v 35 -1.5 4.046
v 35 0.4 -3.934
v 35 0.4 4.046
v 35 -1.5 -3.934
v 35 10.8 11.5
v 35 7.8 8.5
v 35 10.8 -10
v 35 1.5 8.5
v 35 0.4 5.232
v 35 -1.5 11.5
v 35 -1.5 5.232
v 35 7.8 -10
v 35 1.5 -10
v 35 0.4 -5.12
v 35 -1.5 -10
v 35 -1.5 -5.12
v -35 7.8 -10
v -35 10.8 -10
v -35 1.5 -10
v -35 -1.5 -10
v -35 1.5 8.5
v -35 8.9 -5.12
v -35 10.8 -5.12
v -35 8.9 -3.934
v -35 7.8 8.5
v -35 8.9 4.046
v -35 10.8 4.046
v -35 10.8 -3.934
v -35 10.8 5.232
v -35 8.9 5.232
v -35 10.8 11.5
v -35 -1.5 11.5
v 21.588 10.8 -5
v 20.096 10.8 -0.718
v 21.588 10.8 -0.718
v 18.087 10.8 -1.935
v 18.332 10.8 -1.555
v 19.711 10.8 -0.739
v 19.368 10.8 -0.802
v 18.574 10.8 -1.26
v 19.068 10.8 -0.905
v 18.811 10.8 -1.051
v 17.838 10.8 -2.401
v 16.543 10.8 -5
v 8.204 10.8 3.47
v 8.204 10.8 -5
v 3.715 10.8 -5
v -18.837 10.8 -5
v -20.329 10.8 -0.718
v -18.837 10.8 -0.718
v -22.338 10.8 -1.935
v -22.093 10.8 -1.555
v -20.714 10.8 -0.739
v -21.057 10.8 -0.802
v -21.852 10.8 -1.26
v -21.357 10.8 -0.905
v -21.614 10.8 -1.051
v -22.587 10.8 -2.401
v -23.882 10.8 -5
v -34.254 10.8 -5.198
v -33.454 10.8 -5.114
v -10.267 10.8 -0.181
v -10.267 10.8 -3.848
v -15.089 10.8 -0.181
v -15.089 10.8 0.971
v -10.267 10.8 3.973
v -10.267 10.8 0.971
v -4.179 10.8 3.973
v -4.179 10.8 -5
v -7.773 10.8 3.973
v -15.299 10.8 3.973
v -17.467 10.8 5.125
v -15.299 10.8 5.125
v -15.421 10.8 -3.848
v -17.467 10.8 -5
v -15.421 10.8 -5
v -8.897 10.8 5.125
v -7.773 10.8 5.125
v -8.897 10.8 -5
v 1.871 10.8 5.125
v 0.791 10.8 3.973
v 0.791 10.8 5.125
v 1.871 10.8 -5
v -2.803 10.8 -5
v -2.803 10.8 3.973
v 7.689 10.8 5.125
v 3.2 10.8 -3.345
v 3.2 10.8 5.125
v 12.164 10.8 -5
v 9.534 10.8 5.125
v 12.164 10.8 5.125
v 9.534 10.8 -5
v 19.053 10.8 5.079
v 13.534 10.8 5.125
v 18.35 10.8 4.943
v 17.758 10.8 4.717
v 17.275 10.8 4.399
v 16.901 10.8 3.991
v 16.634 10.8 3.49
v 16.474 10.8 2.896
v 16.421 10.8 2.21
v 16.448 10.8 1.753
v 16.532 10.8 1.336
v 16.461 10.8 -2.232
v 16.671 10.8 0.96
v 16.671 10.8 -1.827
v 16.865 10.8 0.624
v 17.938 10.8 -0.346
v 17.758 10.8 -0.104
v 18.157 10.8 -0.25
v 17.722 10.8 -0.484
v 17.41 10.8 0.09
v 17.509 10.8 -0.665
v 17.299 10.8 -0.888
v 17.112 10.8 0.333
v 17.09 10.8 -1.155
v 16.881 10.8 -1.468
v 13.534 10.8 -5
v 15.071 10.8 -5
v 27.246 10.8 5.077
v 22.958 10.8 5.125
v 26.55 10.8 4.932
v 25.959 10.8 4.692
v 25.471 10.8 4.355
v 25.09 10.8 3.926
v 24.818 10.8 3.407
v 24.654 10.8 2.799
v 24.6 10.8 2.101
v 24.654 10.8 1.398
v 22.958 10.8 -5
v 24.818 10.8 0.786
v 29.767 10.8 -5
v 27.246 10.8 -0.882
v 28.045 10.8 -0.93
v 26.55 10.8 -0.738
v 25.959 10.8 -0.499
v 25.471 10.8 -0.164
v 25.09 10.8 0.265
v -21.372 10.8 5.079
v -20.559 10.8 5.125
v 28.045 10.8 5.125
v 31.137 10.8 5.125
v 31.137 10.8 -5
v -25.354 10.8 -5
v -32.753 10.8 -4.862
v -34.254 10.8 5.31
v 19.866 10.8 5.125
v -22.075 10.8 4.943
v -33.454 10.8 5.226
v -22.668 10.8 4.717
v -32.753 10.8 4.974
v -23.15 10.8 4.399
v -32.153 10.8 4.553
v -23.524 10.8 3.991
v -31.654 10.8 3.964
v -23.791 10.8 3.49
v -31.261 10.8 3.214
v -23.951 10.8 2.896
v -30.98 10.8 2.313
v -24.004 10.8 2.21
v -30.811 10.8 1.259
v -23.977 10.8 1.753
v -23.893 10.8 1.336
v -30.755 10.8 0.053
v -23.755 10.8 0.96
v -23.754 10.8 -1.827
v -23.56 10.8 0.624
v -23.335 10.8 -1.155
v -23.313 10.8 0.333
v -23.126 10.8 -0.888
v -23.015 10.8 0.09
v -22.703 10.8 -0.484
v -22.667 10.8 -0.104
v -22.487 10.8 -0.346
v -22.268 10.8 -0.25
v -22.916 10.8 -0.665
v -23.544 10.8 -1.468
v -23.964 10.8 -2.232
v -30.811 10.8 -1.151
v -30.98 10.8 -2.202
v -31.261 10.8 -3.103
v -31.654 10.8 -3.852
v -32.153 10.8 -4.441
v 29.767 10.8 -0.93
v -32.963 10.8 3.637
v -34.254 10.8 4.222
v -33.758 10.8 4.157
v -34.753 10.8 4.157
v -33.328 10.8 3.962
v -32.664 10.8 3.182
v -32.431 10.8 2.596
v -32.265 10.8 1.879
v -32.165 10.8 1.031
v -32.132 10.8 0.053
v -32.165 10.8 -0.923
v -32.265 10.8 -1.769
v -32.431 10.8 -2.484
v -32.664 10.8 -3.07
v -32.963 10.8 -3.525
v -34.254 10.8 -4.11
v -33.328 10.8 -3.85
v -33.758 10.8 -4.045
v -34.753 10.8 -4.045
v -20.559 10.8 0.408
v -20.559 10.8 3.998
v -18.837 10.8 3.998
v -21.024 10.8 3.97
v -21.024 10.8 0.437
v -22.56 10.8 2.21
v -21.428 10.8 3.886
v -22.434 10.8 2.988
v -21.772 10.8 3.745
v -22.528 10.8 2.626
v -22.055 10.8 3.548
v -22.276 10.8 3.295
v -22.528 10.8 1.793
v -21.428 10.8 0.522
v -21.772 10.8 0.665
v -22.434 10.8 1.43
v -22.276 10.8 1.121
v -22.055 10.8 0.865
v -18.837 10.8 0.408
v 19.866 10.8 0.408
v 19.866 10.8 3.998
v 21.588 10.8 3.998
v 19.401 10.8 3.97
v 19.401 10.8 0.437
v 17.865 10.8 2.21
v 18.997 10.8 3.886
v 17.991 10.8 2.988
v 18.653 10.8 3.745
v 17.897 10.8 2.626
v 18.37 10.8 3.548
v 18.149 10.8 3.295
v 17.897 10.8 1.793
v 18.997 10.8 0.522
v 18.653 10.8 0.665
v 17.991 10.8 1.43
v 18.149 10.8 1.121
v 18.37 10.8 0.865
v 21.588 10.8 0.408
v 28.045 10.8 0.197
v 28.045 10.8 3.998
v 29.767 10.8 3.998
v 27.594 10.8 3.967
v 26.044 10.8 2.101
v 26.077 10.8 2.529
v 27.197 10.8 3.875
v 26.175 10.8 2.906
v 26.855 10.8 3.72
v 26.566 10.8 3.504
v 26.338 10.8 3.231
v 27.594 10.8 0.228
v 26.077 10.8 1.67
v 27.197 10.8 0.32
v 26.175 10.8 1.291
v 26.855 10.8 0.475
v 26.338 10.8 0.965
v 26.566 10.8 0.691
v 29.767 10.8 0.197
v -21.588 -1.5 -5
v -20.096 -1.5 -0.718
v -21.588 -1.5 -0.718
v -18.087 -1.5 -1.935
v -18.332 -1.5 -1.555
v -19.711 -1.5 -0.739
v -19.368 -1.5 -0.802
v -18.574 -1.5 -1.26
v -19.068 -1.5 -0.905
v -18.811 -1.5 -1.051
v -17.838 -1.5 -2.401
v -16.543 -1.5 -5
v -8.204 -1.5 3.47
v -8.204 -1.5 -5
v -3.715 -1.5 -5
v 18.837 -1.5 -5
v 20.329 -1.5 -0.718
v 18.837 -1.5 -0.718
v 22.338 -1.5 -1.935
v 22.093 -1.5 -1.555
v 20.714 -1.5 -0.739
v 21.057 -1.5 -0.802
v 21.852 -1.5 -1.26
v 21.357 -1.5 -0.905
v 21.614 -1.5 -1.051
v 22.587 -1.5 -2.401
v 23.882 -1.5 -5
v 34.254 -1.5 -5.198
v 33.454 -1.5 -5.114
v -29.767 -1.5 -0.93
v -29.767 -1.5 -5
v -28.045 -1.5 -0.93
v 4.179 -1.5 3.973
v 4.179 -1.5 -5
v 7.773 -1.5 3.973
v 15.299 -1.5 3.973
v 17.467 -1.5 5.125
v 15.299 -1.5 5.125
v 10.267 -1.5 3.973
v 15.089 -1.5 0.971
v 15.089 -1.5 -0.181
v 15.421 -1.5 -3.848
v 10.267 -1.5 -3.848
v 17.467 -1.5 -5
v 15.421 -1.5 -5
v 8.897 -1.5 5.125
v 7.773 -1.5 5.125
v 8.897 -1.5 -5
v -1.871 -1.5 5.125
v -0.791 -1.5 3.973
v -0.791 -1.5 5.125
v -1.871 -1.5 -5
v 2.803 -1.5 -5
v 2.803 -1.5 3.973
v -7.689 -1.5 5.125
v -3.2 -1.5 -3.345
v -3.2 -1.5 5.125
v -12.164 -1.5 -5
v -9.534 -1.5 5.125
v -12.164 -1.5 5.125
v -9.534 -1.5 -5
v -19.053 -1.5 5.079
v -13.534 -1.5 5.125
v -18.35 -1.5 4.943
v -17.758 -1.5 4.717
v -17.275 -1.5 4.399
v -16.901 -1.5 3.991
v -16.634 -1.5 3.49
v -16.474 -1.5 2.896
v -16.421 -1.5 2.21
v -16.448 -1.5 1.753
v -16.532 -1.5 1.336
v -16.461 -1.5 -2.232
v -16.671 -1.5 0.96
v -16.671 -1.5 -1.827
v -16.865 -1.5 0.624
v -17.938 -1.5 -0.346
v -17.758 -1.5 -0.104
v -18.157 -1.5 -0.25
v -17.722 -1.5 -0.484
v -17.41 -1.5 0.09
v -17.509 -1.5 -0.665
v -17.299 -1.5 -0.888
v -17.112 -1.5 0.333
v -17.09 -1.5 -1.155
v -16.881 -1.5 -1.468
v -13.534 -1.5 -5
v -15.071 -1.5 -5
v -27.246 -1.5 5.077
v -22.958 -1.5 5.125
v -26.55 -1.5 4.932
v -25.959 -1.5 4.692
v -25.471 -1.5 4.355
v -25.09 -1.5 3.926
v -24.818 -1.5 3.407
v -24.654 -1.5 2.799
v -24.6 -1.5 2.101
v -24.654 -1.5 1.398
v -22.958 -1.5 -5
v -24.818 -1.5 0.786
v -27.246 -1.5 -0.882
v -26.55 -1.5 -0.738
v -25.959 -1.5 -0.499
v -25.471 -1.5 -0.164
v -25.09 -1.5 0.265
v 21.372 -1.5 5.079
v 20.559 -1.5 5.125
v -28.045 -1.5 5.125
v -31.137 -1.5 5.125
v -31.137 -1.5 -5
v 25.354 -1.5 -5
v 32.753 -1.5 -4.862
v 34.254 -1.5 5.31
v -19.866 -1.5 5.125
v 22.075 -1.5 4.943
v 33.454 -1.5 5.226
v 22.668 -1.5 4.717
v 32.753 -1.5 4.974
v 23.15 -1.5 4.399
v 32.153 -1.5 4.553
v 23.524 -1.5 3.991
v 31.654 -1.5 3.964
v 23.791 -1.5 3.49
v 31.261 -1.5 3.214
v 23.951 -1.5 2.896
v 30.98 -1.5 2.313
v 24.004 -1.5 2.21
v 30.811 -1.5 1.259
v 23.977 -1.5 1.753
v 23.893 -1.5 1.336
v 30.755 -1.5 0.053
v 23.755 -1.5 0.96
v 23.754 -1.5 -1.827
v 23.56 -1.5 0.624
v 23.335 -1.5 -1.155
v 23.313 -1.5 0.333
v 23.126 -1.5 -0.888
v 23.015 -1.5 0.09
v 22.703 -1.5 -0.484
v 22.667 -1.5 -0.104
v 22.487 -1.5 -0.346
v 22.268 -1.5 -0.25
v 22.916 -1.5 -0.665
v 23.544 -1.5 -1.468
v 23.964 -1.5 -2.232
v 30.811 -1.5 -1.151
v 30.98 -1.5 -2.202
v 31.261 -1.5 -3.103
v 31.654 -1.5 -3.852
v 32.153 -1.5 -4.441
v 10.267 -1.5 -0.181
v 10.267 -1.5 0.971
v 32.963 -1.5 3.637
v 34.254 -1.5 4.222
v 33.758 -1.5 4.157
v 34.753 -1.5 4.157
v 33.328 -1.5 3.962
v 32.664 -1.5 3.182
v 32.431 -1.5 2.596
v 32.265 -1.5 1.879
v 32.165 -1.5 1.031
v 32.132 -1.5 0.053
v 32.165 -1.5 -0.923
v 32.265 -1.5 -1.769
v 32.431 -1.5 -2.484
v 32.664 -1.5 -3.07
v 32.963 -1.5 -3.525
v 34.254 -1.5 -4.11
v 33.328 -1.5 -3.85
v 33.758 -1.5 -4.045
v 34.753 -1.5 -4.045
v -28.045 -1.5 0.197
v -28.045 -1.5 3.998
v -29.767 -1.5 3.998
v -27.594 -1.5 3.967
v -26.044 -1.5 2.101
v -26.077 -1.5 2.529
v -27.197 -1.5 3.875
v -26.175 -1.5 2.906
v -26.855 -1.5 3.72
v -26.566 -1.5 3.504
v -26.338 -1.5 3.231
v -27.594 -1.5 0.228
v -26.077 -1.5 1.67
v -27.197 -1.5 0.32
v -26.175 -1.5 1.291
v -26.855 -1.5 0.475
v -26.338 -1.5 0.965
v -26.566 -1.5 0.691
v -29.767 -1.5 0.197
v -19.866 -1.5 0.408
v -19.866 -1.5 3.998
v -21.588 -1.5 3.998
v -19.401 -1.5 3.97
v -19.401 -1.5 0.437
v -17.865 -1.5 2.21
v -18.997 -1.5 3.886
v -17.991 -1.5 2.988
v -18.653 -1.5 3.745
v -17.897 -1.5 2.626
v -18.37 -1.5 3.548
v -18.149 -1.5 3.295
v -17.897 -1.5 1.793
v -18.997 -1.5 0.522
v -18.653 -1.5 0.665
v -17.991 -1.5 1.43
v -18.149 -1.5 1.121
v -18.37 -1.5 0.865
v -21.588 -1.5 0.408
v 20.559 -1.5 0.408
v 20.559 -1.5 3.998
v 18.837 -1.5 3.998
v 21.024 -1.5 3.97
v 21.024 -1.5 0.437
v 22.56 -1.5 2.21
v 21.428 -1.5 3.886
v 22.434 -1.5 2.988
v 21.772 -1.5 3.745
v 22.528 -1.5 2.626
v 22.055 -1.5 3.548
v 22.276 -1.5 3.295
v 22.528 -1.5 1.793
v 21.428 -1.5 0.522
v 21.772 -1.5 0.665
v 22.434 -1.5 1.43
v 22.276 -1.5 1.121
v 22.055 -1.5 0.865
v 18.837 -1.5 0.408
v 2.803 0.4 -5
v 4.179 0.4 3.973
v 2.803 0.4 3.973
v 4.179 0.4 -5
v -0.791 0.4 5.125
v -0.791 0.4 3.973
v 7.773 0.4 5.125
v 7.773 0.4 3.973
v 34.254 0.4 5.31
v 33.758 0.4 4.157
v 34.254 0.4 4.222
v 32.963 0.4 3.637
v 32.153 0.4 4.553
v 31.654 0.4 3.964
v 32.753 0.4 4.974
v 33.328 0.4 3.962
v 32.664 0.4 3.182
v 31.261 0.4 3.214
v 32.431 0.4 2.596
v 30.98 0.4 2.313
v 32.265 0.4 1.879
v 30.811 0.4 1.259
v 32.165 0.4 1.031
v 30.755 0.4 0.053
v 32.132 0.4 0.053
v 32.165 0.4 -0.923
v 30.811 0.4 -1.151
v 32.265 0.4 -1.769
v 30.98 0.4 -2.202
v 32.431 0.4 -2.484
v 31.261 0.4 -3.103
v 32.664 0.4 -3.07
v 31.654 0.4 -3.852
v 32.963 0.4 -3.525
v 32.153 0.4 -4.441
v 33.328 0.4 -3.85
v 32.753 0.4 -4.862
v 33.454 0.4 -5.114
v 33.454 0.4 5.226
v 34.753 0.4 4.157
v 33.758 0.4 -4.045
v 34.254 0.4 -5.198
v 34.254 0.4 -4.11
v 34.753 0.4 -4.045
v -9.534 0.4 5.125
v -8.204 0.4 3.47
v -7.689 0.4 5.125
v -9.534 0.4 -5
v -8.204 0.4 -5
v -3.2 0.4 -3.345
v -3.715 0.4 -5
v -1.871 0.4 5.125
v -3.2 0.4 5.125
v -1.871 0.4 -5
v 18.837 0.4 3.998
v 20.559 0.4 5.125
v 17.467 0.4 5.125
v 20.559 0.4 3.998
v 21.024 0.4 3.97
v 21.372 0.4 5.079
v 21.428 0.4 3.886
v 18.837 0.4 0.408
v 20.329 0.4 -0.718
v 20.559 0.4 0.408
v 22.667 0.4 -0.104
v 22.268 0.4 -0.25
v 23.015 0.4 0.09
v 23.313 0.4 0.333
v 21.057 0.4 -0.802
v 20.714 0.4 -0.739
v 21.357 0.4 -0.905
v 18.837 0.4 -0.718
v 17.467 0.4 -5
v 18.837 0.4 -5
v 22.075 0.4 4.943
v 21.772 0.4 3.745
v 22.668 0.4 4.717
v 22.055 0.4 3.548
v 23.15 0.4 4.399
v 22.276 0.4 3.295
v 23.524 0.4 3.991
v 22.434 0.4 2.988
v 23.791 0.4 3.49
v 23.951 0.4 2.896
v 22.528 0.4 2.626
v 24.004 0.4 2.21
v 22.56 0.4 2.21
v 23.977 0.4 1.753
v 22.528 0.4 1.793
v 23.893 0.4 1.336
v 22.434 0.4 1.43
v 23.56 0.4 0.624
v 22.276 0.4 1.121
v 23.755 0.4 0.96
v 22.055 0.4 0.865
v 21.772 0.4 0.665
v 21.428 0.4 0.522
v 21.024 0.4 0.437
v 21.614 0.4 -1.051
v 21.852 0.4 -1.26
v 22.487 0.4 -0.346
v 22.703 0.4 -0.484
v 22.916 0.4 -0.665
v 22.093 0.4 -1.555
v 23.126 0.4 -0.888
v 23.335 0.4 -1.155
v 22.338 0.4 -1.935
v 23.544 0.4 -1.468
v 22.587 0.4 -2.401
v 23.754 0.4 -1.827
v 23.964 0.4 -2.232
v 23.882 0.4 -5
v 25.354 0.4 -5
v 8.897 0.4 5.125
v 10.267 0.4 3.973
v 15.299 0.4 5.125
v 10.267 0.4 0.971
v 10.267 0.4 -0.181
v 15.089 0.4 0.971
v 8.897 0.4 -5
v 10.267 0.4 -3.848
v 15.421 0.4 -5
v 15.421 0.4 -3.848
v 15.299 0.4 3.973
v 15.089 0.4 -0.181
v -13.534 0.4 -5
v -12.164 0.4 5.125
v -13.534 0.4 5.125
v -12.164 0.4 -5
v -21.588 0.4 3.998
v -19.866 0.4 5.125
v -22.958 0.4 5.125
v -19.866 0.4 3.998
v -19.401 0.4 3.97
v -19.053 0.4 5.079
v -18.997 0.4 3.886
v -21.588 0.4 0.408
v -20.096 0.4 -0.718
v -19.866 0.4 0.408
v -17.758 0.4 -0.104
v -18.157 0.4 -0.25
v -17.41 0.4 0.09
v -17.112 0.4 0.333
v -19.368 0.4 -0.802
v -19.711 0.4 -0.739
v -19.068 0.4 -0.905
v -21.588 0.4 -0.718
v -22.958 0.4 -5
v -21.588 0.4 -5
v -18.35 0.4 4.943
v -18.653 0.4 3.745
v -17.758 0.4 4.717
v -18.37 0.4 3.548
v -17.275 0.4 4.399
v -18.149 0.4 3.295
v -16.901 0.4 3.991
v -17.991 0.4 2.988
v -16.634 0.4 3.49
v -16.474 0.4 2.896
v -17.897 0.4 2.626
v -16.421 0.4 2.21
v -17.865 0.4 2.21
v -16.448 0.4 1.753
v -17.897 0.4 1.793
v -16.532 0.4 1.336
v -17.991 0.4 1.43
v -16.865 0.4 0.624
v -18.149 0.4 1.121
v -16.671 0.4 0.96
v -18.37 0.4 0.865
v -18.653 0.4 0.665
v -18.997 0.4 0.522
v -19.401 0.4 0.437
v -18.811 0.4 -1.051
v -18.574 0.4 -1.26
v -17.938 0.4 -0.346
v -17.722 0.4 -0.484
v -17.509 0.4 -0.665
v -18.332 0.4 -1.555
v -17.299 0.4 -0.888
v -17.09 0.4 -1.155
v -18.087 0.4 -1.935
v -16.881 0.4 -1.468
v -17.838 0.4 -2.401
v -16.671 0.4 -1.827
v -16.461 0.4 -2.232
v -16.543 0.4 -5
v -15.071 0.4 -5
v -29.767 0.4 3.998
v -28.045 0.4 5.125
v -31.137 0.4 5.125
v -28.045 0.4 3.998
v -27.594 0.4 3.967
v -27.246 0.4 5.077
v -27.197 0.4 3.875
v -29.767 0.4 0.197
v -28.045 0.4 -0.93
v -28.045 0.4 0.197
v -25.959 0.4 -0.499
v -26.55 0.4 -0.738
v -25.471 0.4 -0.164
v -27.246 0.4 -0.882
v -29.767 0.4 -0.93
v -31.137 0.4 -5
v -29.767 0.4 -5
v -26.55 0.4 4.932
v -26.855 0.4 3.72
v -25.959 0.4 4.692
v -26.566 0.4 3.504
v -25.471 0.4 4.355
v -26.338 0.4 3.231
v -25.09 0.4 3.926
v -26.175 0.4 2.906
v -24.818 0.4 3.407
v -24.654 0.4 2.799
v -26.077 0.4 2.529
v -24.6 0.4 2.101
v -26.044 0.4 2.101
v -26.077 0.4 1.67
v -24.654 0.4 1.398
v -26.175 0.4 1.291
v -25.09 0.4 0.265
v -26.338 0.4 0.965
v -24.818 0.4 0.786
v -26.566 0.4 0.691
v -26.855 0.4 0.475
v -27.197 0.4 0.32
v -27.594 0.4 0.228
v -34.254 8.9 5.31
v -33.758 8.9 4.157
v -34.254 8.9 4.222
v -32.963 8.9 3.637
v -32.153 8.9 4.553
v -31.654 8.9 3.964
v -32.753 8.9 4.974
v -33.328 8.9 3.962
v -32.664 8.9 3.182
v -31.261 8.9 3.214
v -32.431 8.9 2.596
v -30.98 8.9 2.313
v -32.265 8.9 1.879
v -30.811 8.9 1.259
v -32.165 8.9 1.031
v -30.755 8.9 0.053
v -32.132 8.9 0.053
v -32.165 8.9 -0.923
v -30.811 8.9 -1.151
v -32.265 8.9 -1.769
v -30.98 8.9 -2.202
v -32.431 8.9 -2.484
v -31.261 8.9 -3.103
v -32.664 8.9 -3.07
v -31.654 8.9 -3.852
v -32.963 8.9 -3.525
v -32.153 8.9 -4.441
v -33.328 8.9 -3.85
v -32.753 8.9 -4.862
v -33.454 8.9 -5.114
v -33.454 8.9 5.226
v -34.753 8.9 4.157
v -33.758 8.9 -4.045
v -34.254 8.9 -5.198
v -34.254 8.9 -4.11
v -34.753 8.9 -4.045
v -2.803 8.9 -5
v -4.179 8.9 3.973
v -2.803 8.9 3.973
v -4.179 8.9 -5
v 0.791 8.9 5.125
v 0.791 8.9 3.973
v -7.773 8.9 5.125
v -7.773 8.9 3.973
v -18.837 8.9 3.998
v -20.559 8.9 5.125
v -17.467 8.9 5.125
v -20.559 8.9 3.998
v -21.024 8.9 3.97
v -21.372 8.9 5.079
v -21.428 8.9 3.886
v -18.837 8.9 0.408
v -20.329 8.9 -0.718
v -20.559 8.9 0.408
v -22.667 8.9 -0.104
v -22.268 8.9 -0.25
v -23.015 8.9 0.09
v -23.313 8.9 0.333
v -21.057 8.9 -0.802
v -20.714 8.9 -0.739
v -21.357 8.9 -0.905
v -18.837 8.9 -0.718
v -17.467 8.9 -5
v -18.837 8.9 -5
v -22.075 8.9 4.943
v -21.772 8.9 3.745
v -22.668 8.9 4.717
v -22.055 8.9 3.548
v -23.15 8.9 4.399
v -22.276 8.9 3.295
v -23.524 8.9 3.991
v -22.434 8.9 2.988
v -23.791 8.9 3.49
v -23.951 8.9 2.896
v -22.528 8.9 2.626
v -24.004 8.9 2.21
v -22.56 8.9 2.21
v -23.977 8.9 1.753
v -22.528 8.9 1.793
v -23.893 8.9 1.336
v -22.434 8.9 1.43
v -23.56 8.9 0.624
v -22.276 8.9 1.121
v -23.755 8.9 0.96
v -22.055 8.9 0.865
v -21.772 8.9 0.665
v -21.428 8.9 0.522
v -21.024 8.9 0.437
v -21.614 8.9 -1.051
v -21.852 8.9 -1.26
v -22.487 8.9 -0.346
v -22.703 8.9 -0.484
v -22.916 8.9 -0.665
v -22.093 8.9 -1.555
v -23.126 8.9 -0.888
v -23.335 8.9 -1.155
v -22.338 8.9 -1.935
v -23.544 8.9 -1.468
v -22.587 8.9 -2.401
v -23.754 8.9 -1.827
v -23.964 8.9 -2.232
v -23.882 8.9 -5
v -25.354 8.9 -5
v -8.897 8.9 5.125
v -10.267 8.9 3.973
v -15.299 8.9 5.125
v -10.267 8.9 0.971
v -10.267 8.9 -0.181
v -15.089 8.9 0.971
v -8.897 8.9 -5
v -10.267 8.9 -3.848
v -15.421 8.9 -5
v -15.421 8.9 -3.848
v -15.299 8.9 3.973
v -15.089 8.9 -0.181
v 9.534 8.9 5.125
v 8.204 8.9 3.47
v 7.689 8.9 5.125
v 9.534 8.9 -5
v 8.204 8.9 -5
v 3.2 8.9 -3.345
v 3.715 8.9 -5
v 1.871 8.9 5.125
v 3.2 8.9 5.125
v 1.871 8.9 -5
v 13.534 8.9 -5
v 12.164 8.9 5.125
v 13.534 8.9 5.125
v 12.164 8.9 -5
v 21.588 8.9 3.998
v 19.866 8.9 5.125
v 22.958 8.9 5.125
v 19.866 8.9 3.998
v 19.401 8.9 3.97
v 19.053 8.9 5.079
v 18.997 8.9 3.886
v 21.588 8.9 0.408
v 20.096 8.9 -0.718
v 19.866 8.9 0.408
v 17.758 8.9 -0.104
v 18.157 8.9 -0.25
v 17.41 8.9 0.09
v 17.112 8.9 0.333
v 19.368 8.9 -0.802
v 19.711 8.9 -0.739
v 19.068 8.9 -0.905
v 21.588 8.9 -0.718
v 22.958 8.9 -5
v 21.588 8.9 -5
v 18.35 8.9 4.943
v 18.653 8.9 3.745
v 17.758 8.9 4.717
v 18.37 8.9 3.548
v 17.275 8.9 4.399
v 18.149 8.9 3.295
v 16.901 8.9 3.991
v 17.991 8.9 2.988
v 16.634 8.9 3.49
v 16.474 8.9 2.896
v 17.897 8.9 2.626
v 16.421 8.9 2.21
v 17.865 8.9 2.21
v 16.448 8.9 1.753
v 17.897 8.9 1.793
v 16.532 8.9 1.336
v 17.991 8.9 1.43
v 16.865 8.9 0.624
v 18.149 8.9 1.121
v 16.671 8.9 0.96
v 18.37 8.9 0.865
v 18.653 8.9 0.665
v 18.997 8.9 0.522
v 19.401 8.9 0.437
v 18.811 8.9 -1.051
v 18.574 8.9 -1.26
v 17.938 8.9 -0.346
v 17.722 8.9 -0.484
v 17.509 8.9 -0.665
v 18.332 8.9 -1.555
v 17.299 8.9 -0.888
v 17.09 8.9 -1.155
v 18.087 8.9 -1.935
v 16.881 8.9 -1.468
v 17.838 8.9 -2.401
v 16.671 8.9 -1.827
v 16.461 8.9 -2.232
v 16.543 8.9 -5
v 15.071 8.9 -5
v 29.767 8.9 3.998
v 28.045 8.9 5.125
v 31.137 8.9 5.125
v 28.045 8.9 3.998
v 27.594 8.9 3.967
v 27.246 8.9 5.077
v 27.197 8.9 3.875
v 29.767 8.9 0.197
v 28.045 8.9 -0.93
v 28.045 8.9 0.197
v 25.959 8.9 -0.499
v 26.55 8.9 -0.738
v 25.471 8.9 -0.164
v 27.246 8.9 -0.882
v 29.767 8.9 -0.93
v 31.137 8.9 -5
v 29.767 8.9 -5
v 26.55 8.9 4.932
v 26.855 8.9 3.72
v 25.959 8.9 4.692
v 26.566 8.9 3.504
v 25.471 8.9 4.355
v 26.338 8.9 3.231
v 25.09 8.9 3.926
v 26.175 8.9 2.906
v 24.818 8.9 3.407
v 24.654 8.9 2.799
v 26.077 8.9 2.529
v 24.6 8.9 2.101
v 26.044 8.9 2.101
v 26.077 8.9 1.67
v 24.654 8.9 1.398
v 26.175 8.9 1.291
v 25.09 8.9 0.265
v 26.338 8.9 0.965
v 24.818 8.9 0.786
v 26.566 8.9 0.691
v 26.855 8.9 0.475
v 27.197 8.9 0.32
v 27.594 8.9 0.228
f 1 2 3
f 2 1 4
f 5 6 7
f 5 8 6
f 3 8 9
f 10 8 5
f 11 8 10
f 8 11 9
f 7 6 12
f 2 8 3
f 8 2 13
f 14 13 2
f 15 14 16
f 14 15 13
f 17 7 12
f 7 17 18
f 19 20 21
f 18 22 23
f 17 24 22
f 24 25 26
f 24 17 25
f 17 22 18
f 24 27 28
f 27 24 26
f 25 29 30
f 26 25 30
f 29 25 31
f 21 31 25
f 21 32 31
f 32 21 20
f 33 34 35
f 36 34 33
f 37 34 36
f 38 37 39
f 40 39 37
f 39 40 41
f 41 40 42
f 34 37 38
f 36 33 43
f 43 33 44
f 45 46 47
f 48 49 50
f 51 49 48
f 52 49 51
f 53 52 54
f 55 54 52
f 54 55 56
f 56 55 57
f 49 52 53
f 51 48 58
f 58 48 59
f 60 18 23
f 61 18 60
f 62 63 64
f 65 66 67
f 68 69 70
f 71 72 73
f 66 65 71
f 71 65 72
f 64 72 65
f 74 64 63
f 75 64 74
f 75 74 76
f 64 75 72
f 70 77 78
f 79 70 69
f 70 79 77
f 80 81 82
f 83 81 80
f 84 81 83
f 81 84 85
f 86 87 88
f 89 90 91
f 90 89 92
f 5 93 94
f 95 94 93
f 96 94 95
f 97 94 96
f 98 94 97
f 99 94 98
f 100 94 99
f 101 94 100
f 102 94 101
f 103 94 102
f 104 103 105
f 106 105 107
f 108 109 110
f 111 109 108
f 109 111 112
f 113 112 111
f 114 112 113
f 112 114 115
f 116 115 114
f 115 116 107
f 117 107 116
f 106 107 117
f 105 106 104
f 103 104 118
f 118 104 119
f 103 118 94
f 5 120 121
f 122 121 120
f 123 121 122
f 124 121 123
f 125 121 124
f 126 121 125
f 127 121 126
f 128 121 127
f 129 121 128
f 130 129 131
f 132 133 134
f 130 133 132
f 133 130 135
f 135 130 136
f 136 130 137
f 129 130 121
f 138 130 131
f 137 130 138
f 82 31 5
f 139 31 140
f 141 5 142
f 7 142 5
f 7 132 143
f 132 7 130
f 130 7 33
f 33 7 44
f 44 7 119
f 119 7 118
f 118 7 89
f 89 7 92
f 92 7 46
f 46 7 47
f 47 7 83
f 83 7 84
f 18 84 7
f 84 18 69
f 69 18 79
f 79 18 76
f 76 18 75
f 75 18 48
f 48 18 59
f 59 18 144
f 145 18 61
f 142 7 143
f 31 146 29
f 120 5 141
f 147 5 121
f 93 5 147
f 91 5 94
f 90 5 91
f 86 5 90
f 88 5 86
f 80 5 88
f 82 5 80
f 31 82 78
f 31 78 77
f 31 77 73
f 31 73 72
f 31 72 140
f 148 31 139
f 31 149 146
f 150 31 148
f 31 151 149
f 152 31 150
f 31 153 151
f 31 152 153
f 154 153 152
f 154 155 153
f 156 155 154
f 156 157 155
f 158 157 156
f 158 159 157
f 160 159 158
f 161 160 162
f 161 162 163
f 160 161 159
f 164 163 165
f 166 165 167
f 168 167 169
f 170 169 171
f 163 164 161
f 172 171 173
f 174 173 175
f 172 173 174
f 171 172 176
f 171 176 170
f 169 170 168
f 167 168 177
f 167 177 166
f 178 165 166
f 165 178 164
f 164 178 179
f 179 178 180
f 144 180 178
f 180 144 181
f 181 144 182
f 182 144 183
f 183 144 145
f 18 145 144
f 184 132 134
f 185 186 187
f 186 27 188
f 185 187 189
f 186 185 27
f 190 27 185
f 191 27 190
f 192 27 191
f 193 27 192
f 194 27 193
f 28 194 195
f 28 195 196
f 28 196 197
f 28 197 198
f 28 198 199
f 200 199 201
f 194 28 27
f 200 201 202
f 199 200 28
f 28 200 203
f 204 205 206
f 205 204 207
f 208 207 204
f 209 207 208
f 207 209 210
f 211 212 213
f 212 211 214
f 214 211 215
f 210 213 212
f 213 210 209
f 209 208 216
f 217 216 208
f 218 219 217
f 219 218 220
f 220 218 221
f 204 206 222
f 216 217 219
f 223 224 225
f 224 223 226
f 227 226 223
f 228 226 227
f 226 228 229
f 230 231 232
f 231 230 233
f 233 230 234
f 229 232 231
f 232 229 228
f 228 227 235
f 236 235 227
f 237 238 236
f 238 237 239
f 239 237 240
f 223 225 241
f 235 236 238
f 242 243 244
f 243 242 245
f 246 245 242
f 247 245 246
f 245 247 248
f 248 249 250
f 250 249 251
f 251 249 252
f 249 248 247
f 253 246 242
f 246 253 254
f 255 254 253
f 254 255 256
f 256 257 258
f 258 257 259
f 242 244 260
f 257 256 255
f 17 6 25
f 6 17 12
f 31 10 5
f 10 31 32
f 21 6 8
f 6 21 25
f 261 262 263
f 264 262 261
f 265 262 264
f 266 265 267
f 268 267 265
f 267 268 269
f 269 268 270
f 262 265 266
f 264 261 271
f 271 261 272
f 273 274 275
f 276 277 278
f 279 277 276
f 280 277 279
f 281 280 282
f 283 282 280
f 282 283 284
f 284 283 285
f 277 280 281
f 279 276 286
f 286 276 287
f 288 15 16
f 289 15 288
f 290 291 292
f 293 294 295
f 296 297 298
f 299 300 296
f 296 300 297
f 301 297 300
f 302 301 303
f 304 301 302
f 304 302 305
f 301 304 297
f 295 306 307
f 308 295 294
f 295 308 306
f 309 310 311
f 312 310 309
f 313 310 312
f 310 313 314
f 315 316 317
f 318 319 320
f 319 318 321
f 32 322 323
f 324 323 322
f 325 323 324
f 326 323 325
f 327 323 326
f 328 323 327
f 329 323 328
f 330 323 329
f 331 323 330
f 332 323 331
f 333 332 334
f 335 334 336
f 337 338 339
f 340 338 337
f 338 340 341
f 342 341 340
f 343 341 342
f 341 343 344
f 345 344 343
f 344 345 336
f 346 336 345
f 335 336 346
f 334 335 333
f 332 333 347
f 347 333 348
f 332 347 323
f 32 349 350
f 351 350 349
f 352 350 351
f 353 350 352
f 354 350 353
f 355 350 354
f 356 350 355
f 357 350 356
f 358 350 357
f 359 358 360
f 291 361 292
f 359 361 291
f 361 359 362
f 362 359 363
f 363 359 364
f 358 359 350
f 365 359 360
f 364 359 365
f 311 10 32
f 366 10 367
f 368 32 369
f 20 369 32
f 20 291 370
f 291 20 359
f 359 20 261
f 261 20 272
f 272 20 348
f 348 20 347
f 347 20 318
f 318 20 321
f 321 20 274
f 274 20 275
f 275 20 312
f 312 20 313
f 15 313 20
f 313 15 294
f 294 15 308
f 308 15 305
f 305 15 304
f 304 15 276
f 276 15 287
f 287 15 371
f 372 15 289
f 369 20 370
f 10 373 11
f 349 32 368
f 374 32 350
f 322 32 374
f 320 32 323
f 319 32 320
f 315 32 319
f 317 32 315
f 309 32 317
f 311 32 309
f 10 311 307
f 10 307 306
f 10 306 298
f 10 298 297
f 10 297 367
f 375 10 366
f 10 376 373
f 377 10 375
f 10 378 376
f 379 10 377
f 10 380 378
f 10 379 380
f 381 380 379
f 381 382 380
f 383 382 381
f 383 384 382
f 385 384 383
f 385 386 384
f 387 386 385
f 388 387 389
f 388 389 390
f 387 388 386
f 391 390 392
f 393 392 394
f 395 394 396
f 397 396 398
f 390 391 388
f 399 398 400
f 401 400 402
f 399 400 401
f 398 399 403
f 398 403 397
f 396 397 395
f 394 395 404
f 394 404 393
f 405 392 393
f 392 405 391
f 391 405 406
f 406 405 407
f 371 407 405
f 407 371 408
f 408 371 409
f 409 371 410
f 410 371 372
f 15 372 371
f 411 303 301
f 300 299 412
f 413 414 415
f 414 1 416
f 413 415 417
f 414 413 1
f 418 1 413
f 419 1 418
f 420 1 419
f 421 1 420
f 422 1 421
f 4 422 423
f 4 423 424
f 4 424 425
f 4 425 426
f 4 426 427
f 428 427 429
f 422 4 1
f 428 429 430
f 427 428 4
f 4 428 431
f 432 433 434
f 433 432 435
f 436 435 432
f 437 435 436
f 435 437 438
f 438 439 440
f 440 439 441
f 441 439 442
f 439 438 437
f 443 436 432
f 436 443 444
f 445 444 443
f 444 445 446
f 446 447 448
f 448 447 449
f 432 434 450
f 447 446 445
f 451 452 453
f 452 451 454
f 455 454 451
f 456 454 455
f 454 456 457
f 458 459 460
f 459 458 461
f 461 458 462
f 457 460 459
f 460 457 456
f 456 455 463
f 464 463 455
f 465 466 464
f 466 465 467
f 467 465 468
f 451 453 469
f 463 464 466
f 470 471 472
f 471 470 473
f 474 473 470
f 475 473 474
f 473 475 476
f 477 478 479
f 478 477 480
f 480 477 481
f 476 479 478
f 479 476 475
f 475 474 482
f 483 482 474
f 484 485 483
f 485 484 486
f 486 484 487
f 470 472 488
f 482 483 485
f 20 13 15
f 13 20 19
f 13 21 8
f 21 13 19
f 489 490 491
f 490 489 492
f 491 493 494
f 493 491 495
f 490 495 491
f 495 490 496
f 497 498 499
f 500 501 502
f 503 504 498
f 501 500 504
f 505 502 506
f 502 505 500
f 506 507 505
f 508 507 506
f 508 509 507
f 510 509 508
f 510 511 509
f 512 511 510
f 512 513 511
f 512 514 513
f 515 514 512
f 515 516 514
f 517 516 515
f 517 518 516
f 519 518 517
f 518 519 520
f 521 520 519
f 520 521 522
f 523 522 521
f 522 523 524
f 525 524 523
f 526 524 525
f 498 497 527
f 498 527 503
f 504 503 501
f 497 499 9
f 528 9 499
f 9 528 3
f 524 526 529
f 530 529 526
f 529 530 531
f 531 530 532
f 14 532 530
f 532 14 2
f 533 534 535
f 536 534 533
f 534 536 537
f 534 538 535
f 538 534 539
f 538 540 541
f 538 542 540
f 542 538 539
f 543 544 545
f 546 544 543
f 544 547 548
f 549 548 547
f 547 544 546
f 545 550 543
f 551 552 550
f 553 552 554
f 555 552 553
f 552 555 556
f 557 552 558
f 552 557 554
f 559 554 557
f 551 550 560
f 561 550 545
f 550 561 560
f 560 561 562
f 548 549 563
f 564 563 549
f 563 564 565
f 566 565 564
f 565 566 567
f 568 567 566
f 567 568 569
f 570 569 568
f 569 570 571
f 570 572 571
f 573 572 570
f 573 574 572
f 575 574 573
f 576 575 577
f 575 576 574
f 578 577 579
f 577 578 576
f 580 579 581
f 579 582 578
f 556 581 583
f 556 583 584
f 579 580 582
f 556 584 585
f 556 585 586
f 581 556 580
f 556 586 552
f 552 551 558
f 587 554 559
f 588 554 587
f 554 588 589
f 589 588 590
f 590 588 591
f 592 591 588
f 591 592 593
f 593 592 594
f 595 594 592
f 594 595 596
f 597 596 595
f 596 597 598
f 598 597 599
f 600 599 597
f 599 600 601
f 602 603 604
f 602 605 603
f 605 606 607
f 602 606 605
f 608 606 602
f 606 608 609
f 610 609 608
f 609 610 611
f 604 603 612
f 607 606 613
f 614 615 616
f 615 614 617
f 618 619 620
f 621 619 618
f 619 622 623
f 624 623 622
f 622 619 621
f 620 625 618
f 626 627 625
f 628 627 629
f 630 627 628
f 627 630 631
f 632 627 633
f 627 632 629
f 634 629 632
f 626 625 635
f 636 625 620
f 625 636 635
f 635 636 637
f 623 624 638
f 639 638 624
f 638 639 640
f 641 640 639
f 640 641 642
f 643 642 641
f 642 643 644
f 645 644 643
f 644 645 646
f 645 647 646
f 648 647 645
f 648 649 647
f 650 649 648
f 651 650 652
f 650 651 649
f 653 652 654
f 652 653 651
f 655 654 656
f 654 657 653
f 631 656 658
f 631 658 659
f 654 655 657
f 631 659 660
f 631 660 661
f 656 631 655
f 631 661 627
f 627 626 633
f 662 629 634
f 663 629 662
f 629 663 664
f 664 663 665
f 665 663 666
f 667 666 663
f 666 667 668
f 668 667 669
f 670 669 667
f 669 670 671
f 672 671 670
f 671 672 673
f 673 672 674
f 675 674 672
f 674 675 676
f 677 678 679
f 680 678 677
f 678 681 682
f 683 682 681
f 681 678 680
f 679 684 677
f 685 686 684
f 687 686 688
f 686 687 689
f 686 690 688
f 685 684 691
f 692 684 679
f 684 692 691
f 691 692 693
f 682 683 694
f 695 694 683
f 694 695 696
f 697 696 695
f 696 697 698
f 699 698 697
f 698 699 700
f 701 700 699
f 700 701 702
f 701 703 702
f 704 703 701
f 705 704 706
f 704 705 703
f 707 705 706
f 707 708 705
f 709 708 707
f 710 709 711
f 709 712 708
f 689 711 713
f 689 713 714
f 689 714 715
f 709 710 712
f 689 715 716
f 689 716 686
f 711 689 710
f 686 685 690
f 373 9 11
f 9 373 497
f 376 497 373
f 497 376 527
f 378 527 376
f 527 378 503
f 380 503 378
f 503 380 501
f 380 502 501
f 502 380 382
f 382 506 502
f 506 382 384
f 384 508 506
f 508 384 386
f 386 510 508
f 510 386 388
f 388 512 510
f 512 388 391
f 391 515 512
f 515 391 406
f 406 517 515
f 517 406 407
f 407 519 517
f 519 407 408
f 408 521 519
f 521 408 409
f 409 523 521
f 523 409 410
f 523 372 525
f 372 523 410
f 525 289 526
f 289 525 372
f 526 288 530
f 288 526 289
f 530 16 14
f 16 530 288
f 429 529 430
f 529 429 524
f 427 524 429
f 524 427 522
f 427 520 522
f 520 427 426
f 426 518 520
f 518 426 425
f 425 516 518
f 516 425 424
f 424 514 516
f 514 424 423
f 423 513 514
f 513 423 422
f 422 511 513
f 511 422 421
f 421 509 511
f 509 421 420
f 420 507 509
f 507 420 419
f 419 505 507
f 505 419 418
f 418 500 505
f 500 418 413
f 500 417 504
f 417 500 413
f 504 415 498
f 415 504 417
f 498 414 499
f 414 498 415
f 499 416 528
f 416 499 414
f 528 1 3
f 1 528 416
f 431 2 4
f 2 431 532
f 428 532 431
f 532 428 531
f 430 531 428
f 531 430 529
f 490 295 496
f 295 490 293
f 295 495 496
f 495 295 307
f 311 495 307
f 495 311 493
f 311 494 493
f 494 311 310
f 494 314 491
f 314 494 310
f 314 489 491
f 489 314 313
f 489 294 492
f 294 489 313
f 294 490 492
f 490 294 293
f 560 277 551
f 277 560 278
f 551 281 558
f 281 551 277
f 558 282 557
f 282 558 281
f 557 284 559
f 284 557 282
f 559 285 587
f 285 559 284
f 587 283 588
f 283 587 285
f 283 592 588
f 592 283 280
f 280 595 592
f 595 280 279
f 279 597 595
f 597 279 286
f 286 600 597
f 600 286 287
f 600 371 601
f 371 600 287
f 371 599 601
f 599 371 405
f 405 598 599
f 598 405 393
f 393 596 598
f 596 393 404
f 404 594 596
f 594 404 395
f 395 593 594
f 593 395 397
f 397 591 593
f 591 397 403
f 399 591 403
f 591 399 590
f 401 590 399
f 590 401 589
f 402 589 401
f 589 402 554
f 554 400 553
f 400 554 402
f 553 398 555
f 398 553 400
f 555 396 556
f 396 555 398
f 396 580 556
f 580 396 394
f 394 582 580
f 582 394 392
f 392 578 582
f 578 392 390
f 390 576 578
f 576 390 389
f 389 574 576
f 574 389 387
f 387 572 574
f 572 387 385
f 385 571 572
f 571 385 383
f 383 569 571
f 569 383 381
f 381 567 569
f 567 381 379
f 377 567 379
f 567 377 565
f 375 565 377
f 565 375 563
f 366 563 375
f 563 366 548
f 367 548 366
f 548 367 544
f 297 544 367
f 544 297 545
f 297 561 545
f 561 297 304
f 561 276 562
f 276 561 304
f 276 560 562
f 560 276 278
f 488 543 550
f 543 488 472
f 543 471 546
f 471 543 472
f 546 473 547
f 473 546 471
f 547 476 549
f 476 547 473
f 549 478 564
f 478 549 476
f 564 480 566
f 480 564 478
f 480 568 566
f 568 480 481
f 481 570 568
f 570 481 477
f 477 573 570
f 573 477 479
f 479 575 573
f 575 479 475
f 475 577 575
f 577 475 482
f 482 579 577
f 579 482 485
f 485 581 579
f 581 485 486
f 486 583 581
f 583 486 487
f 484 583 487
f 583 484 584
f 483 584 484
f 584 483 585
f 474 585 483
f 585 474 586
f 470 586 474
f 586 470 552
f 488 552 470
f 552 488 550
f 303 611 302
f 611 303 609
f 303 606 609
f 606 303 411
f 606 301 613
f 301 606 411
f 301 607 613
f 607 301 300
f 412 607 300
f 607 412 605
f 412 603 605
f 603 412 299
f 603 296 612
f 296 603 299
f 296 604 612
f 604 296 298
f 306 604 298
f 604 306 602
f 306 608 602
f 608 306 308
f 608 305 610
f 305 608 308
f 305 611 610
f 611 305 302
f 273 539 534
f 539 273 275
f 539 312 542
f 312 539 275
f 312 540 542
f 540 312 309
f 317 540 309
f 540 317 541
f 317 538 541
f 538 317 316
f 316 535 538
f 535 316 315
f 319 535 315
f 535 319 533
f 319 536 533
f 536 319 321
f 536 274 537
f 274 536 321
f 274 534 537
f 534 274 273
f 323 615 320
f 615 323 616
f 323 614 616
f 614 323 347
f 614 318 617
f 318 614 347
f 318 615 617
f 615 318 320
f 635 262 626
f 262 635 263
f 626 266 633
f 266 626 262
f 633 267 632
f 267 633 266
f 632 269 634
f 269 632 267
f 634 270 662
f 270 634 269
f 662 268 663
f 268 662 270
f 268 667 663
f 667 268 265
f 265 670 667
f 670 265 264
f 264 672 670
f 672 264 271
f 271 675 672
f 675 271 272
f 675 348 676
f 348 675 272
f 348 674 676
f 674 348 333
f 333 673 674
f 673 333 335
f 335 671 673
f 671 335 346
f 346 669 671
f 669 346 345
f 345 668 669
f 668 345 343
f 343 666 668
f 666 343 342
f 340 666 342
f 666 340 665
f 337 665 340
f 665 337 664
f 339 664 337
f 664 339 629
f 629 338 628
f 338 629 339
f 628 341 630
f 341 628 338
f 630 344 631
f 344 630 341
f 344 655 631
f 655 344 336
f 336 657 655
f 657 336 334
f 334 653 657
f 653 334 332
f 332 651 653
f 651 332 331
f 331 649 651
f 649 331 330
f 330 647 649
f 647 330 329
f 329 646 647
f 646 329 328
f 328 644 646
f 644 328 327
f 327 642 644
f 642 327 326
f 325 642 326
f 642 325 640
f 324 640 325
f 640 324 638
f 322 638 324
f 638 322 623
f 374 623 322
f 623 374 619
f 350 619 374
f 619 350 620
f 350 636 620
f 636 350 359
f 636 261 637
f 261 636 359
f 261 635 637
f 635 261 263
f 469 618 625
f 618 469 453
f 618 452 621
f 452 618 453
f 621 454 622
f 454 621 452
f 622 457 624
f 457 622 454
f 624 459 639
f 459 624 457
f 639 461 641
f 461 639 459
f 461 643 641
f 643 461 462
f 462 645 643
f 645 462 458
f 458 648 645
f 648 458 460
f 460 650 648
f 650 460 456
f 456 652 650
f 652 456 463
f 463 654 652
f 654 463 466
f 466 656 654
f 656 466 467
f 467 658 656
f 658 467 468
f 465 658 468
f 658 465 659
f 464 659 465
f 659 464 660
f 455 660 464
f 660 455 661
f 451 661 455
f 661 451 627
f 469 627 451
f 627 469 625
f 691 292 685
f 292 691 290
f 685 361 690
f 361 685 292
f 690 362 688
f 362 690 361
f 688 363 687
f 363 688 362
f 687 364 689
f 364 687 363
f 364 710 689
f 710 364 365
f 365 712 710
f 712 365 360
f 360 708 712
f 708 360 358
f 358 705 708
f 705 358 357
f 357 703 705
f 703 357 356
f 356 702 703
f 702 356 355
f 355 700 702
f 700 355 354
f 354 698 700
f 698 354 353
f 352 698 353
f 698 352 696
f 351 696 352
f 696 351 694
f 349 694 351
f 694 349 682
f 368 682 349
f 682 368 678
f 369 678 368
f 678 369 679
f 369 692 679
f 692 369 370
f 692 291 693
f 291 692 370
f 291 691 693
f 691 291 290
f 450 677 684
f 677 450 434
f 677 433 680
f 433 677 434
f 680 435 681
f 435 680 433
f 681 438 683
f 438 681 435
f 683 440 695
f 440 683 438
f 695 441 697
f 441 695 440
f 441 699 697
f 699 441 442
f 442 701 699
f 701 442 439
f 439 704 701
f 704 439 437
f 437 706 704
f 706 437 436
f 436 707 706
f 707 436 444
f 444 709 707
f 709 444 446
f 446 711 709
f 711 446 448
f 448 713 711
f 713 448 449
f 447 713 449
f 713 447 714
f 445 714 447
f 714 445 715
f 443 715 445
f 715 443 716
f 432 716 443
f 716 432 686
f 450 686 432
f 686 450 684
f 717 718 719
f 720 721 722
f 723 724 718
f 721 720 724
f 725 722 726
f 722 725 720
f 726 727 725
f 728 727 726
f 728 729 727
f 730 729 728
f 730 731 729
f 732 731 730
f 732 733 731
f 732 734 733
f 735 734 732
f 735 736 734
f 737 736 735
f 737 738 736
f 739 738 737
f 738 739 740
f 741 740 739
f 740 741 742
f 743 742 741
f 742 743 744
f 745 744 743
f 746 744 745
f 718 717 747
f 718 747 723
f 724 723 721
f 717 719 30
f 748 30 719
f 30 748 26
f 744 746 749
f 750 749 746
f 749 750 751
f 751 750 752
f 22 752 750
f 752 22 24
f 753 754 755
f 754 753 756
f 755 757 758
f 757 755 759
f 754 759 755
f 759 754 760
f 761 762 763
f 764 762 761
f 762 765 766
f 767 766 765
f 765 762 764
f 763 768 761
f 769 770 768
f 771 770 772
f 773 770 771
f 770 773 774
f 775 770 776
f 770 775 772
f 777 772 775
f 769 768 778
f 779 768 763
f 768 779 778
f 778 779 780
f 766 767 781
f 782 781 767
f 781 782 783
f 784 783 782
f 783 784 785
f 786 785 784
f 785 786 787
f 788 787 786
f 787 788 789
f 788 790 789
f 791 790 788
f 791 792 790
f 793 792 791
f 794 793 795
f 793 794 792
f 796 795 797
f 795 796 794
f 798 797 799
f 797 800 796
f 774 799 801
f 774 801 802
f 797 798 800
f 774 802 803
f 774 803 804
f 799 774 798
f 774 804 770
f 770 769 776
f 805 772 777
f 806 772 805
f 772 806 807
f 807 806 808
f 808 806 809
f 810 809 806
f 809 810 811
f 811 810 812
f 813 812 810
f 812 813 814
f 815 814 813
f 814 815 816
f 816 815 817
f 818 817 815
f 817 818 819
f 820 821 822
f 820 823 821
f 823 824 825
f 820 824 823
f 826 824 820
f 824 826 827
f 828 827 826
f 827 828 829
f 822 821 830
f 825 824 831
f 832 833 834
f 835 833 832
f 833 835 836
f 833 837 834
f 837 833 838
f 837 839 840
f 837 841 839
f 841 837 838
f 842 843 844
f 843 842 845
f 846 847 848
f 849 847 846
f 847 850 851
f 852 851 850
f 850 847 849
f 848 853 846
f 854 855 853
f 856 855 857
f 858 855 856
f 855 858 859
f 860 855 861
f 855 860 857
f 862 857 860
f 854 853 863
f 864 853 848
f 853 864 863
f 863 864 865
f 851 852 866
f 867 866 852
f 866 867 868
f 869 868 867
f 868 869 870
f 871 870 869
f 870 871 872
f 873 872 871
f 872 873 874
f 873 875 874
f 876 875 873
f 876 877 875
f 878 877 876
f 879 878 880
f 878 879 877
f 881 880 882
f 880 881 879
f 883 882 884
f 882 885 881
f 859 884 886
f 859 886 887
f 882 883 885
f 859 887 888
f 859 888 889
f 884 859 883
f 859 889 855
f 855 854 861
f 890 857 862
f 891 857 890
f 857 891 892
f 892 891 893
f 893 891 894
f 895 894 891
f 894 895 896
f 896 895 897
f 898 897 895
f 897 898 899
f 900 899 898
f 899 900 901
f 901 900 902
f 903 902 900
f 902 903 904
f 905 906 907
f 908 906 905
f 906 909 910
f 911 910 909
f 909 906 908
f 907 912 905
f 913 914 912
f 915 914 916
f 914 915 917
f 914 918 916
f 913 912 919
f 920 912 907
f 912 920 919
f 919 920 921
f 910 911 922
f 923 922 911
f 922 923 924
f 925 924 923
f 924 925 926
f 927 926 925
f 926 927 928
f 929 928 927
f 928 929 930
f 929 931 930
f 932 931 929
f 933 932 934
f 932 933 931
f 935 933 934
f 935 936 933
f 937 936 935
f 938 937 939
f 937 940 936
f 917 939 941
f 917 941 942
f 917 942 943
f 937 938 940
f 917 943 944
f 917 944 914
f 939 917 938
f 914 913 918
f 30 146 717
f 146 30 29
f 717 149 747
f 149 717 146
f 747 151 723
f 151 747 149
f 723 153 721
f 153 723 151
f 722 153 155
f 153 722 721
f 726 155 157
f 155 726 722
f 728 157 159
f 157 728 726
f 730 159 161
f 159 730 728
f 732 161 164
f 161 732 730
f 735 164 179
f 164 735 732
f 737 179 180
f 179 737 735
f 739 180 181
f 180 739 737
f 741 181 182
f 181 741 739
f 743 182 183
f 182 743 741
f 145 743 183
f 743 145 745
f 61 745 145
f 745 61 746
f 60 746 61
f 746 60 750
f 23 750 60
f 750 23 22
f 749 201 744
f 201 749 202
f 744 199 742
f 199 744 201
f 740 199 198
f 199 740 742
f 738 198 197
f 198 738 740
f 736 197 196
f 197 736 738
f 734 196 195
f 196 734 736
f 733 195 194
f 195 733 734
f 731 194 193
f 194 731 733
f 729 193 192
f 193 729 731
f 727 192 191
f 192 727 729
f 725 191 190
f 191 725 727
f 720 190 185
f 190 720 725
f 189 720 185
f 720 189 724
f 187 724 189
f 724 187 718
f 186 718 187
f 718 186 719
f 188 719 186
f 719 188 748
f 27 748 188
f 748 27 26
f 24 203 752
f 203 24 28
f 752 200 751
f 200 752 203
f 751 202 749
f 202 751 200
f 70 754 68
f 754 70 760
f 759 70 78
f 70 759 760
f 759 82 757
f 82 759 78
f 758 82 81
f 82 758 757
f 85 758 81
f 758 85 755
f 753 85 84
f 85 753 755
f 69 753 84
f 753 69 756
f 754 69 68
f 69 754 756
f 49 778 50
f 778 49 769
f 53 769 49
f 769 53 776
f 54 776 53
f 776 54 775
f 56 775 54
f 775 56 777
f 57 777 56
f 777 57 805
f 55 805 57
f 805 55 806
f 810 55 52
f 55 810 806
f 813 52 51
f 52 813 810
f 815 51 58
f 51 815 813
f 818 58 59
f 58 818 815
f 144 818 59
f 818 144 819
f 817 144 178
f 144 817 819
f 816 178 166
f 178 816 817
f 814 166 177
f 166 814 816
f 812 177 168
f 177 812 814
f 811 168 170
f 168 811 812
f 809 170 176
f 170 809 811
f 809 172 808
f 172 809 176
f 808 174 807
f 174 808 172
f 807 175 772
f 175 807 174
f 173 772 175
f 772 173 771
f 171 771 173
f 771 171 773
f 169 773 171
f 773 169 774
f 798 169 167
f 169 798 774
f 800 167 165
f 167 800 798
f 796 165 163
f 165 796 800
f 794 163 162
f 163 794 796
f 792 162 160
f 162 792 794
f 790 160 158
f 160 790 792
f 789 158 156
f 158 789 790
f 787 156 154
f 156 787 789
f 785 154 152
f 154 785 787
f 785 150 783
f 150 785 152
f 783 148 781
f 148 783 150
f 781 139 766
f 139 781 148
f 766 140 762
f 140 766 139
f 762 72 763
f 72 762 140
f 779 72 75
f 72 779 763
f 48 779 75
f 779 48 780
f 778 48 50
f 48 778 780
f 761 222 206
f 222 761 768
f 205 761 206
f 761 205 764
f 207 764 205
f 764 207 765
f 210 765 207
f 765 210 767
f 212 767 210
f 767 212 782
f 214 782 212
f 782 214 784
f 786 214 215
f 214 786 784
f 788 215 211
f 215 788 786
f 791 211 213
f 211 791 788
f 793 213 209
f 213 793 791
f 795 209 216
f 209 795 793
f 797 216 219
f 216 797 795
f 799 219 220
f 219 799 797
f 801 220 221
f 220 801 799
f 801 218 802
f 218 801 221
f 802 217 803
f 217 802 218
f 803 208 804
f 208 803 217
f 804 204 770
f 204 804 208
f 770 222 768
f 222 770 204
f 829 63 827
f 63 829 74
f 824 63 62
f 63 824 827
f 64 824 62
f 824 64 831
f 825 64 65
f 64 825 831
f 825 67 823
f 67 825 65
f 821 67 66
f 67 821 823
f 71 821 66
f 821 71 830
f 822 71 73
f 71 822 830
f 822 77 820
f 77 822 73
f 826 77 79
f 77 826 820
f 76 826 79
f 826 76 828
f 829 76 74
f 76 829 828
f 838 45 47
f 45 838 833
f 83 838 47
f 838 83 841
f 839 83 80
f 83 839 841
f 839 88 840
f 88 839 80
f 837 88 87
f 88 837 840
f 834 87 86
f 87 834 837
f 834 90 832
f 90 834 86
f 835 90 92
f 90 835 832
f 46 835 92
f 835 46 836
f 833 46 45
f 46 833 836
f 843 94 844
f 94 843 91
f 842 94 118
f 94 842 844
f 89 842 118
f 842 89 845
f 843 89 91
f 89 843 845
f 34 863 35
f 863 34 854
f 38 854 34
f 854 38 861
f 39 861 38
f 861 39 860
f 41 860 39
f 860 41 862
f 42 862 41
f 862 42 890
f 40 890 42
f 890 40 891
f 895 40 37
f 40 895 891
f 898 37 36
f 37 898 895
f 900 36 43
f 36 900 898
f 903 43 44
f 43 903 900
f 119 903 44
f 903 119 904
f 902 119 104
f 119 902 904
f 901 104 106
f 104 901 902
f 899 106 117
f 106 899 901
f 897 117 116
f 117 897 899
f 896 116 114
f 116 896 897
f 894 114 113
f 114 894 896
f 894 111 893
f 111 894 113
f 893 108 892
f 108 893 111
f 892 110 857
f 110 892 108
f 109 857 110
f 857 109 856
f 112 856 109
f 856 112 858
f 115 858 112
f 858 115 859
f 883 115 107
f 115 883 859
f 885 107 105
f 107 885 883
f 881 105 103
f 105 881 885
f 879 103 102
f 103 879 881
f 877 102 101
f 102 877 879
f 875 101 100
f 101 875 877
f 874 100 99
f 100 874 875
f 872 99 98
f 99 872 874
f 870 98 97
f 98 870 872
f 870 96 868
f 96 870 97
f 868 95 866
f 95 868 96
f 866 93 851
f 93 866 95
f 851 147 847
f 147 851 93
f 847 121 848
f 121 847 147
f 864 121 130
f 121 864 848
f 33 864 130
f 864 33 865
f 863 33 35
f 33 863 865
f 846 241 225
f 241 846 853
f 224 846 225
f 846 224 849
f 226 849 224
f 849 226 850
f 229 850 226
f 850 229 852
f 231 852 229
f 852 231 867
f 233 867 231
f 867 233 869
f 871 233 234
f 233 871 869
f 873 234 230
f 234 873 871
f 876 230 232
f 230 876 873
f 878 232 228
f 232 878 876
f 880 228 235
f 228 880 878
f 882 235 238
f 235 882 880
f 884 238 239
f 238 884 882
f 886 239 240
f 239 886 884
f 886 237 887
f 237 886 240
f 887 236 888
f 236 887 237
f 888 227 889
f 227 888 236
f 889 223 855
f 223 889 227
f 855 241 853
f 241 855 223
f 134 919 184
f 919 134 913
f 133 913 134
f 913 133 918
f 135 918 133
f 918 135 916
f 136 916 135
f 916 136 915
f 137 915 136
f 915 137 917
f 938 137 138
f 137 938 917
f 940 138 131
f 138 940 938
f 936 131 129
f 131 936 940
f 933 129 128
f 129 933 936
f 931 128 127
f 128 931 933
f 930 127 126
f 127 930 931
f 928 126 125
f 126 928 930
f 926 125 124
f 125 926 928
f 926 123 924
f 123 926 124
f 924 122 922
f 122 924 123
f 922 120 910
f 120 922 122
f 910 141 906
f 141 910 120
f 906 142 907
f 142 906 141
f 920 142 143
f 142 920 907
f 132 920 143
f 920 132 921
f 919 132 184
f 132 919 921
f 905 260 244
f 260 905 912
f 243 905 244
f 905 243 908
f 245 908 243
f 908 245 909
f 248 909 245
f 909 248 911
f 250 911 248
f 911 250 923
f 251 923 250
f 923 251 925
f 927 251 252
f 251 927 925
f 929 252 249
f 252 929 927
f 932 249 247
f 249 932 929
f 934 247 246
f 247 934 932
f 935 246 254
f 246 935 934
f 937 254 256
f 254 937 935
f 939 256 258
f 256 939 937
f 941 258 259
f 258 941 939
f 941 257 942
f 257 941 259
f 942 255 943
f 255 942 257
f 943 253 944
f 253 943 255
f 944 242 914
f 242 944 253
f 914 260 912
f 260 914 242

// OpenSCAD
name = "PRINTER 02"; // Printer name
width = 70; // tag width
height = 20; // tag height

text_size = 10; // text size
text_thickness = 2;
font="Marker Felt:style=Thin";
thickness = 3;


module base() {
    translate([0,6.3+thickness,0]) cube([width,thickness,height], center=true);
    translate([0,(6.3+thickness*2)/2-thickness/2,height/2]) cube([width,6.3+thickness*2,thickness], center=true);
    cube([width,thickness,height], center=true);
}

module render_text() {
    translate([-width/2+text_size/4,-thickness/2+text_thickness-0.1,-text_size/2]) rotate([90,0,0]) linear_extrude(text_thickness) text(name, size=text_size, font=font);
}

difference() {
    base();
    render_text();
    
    translate([0,6.3+text_thickness/2+thickness-text_thickness/2,0]) rotate([0,0,180]) render_text();
}
